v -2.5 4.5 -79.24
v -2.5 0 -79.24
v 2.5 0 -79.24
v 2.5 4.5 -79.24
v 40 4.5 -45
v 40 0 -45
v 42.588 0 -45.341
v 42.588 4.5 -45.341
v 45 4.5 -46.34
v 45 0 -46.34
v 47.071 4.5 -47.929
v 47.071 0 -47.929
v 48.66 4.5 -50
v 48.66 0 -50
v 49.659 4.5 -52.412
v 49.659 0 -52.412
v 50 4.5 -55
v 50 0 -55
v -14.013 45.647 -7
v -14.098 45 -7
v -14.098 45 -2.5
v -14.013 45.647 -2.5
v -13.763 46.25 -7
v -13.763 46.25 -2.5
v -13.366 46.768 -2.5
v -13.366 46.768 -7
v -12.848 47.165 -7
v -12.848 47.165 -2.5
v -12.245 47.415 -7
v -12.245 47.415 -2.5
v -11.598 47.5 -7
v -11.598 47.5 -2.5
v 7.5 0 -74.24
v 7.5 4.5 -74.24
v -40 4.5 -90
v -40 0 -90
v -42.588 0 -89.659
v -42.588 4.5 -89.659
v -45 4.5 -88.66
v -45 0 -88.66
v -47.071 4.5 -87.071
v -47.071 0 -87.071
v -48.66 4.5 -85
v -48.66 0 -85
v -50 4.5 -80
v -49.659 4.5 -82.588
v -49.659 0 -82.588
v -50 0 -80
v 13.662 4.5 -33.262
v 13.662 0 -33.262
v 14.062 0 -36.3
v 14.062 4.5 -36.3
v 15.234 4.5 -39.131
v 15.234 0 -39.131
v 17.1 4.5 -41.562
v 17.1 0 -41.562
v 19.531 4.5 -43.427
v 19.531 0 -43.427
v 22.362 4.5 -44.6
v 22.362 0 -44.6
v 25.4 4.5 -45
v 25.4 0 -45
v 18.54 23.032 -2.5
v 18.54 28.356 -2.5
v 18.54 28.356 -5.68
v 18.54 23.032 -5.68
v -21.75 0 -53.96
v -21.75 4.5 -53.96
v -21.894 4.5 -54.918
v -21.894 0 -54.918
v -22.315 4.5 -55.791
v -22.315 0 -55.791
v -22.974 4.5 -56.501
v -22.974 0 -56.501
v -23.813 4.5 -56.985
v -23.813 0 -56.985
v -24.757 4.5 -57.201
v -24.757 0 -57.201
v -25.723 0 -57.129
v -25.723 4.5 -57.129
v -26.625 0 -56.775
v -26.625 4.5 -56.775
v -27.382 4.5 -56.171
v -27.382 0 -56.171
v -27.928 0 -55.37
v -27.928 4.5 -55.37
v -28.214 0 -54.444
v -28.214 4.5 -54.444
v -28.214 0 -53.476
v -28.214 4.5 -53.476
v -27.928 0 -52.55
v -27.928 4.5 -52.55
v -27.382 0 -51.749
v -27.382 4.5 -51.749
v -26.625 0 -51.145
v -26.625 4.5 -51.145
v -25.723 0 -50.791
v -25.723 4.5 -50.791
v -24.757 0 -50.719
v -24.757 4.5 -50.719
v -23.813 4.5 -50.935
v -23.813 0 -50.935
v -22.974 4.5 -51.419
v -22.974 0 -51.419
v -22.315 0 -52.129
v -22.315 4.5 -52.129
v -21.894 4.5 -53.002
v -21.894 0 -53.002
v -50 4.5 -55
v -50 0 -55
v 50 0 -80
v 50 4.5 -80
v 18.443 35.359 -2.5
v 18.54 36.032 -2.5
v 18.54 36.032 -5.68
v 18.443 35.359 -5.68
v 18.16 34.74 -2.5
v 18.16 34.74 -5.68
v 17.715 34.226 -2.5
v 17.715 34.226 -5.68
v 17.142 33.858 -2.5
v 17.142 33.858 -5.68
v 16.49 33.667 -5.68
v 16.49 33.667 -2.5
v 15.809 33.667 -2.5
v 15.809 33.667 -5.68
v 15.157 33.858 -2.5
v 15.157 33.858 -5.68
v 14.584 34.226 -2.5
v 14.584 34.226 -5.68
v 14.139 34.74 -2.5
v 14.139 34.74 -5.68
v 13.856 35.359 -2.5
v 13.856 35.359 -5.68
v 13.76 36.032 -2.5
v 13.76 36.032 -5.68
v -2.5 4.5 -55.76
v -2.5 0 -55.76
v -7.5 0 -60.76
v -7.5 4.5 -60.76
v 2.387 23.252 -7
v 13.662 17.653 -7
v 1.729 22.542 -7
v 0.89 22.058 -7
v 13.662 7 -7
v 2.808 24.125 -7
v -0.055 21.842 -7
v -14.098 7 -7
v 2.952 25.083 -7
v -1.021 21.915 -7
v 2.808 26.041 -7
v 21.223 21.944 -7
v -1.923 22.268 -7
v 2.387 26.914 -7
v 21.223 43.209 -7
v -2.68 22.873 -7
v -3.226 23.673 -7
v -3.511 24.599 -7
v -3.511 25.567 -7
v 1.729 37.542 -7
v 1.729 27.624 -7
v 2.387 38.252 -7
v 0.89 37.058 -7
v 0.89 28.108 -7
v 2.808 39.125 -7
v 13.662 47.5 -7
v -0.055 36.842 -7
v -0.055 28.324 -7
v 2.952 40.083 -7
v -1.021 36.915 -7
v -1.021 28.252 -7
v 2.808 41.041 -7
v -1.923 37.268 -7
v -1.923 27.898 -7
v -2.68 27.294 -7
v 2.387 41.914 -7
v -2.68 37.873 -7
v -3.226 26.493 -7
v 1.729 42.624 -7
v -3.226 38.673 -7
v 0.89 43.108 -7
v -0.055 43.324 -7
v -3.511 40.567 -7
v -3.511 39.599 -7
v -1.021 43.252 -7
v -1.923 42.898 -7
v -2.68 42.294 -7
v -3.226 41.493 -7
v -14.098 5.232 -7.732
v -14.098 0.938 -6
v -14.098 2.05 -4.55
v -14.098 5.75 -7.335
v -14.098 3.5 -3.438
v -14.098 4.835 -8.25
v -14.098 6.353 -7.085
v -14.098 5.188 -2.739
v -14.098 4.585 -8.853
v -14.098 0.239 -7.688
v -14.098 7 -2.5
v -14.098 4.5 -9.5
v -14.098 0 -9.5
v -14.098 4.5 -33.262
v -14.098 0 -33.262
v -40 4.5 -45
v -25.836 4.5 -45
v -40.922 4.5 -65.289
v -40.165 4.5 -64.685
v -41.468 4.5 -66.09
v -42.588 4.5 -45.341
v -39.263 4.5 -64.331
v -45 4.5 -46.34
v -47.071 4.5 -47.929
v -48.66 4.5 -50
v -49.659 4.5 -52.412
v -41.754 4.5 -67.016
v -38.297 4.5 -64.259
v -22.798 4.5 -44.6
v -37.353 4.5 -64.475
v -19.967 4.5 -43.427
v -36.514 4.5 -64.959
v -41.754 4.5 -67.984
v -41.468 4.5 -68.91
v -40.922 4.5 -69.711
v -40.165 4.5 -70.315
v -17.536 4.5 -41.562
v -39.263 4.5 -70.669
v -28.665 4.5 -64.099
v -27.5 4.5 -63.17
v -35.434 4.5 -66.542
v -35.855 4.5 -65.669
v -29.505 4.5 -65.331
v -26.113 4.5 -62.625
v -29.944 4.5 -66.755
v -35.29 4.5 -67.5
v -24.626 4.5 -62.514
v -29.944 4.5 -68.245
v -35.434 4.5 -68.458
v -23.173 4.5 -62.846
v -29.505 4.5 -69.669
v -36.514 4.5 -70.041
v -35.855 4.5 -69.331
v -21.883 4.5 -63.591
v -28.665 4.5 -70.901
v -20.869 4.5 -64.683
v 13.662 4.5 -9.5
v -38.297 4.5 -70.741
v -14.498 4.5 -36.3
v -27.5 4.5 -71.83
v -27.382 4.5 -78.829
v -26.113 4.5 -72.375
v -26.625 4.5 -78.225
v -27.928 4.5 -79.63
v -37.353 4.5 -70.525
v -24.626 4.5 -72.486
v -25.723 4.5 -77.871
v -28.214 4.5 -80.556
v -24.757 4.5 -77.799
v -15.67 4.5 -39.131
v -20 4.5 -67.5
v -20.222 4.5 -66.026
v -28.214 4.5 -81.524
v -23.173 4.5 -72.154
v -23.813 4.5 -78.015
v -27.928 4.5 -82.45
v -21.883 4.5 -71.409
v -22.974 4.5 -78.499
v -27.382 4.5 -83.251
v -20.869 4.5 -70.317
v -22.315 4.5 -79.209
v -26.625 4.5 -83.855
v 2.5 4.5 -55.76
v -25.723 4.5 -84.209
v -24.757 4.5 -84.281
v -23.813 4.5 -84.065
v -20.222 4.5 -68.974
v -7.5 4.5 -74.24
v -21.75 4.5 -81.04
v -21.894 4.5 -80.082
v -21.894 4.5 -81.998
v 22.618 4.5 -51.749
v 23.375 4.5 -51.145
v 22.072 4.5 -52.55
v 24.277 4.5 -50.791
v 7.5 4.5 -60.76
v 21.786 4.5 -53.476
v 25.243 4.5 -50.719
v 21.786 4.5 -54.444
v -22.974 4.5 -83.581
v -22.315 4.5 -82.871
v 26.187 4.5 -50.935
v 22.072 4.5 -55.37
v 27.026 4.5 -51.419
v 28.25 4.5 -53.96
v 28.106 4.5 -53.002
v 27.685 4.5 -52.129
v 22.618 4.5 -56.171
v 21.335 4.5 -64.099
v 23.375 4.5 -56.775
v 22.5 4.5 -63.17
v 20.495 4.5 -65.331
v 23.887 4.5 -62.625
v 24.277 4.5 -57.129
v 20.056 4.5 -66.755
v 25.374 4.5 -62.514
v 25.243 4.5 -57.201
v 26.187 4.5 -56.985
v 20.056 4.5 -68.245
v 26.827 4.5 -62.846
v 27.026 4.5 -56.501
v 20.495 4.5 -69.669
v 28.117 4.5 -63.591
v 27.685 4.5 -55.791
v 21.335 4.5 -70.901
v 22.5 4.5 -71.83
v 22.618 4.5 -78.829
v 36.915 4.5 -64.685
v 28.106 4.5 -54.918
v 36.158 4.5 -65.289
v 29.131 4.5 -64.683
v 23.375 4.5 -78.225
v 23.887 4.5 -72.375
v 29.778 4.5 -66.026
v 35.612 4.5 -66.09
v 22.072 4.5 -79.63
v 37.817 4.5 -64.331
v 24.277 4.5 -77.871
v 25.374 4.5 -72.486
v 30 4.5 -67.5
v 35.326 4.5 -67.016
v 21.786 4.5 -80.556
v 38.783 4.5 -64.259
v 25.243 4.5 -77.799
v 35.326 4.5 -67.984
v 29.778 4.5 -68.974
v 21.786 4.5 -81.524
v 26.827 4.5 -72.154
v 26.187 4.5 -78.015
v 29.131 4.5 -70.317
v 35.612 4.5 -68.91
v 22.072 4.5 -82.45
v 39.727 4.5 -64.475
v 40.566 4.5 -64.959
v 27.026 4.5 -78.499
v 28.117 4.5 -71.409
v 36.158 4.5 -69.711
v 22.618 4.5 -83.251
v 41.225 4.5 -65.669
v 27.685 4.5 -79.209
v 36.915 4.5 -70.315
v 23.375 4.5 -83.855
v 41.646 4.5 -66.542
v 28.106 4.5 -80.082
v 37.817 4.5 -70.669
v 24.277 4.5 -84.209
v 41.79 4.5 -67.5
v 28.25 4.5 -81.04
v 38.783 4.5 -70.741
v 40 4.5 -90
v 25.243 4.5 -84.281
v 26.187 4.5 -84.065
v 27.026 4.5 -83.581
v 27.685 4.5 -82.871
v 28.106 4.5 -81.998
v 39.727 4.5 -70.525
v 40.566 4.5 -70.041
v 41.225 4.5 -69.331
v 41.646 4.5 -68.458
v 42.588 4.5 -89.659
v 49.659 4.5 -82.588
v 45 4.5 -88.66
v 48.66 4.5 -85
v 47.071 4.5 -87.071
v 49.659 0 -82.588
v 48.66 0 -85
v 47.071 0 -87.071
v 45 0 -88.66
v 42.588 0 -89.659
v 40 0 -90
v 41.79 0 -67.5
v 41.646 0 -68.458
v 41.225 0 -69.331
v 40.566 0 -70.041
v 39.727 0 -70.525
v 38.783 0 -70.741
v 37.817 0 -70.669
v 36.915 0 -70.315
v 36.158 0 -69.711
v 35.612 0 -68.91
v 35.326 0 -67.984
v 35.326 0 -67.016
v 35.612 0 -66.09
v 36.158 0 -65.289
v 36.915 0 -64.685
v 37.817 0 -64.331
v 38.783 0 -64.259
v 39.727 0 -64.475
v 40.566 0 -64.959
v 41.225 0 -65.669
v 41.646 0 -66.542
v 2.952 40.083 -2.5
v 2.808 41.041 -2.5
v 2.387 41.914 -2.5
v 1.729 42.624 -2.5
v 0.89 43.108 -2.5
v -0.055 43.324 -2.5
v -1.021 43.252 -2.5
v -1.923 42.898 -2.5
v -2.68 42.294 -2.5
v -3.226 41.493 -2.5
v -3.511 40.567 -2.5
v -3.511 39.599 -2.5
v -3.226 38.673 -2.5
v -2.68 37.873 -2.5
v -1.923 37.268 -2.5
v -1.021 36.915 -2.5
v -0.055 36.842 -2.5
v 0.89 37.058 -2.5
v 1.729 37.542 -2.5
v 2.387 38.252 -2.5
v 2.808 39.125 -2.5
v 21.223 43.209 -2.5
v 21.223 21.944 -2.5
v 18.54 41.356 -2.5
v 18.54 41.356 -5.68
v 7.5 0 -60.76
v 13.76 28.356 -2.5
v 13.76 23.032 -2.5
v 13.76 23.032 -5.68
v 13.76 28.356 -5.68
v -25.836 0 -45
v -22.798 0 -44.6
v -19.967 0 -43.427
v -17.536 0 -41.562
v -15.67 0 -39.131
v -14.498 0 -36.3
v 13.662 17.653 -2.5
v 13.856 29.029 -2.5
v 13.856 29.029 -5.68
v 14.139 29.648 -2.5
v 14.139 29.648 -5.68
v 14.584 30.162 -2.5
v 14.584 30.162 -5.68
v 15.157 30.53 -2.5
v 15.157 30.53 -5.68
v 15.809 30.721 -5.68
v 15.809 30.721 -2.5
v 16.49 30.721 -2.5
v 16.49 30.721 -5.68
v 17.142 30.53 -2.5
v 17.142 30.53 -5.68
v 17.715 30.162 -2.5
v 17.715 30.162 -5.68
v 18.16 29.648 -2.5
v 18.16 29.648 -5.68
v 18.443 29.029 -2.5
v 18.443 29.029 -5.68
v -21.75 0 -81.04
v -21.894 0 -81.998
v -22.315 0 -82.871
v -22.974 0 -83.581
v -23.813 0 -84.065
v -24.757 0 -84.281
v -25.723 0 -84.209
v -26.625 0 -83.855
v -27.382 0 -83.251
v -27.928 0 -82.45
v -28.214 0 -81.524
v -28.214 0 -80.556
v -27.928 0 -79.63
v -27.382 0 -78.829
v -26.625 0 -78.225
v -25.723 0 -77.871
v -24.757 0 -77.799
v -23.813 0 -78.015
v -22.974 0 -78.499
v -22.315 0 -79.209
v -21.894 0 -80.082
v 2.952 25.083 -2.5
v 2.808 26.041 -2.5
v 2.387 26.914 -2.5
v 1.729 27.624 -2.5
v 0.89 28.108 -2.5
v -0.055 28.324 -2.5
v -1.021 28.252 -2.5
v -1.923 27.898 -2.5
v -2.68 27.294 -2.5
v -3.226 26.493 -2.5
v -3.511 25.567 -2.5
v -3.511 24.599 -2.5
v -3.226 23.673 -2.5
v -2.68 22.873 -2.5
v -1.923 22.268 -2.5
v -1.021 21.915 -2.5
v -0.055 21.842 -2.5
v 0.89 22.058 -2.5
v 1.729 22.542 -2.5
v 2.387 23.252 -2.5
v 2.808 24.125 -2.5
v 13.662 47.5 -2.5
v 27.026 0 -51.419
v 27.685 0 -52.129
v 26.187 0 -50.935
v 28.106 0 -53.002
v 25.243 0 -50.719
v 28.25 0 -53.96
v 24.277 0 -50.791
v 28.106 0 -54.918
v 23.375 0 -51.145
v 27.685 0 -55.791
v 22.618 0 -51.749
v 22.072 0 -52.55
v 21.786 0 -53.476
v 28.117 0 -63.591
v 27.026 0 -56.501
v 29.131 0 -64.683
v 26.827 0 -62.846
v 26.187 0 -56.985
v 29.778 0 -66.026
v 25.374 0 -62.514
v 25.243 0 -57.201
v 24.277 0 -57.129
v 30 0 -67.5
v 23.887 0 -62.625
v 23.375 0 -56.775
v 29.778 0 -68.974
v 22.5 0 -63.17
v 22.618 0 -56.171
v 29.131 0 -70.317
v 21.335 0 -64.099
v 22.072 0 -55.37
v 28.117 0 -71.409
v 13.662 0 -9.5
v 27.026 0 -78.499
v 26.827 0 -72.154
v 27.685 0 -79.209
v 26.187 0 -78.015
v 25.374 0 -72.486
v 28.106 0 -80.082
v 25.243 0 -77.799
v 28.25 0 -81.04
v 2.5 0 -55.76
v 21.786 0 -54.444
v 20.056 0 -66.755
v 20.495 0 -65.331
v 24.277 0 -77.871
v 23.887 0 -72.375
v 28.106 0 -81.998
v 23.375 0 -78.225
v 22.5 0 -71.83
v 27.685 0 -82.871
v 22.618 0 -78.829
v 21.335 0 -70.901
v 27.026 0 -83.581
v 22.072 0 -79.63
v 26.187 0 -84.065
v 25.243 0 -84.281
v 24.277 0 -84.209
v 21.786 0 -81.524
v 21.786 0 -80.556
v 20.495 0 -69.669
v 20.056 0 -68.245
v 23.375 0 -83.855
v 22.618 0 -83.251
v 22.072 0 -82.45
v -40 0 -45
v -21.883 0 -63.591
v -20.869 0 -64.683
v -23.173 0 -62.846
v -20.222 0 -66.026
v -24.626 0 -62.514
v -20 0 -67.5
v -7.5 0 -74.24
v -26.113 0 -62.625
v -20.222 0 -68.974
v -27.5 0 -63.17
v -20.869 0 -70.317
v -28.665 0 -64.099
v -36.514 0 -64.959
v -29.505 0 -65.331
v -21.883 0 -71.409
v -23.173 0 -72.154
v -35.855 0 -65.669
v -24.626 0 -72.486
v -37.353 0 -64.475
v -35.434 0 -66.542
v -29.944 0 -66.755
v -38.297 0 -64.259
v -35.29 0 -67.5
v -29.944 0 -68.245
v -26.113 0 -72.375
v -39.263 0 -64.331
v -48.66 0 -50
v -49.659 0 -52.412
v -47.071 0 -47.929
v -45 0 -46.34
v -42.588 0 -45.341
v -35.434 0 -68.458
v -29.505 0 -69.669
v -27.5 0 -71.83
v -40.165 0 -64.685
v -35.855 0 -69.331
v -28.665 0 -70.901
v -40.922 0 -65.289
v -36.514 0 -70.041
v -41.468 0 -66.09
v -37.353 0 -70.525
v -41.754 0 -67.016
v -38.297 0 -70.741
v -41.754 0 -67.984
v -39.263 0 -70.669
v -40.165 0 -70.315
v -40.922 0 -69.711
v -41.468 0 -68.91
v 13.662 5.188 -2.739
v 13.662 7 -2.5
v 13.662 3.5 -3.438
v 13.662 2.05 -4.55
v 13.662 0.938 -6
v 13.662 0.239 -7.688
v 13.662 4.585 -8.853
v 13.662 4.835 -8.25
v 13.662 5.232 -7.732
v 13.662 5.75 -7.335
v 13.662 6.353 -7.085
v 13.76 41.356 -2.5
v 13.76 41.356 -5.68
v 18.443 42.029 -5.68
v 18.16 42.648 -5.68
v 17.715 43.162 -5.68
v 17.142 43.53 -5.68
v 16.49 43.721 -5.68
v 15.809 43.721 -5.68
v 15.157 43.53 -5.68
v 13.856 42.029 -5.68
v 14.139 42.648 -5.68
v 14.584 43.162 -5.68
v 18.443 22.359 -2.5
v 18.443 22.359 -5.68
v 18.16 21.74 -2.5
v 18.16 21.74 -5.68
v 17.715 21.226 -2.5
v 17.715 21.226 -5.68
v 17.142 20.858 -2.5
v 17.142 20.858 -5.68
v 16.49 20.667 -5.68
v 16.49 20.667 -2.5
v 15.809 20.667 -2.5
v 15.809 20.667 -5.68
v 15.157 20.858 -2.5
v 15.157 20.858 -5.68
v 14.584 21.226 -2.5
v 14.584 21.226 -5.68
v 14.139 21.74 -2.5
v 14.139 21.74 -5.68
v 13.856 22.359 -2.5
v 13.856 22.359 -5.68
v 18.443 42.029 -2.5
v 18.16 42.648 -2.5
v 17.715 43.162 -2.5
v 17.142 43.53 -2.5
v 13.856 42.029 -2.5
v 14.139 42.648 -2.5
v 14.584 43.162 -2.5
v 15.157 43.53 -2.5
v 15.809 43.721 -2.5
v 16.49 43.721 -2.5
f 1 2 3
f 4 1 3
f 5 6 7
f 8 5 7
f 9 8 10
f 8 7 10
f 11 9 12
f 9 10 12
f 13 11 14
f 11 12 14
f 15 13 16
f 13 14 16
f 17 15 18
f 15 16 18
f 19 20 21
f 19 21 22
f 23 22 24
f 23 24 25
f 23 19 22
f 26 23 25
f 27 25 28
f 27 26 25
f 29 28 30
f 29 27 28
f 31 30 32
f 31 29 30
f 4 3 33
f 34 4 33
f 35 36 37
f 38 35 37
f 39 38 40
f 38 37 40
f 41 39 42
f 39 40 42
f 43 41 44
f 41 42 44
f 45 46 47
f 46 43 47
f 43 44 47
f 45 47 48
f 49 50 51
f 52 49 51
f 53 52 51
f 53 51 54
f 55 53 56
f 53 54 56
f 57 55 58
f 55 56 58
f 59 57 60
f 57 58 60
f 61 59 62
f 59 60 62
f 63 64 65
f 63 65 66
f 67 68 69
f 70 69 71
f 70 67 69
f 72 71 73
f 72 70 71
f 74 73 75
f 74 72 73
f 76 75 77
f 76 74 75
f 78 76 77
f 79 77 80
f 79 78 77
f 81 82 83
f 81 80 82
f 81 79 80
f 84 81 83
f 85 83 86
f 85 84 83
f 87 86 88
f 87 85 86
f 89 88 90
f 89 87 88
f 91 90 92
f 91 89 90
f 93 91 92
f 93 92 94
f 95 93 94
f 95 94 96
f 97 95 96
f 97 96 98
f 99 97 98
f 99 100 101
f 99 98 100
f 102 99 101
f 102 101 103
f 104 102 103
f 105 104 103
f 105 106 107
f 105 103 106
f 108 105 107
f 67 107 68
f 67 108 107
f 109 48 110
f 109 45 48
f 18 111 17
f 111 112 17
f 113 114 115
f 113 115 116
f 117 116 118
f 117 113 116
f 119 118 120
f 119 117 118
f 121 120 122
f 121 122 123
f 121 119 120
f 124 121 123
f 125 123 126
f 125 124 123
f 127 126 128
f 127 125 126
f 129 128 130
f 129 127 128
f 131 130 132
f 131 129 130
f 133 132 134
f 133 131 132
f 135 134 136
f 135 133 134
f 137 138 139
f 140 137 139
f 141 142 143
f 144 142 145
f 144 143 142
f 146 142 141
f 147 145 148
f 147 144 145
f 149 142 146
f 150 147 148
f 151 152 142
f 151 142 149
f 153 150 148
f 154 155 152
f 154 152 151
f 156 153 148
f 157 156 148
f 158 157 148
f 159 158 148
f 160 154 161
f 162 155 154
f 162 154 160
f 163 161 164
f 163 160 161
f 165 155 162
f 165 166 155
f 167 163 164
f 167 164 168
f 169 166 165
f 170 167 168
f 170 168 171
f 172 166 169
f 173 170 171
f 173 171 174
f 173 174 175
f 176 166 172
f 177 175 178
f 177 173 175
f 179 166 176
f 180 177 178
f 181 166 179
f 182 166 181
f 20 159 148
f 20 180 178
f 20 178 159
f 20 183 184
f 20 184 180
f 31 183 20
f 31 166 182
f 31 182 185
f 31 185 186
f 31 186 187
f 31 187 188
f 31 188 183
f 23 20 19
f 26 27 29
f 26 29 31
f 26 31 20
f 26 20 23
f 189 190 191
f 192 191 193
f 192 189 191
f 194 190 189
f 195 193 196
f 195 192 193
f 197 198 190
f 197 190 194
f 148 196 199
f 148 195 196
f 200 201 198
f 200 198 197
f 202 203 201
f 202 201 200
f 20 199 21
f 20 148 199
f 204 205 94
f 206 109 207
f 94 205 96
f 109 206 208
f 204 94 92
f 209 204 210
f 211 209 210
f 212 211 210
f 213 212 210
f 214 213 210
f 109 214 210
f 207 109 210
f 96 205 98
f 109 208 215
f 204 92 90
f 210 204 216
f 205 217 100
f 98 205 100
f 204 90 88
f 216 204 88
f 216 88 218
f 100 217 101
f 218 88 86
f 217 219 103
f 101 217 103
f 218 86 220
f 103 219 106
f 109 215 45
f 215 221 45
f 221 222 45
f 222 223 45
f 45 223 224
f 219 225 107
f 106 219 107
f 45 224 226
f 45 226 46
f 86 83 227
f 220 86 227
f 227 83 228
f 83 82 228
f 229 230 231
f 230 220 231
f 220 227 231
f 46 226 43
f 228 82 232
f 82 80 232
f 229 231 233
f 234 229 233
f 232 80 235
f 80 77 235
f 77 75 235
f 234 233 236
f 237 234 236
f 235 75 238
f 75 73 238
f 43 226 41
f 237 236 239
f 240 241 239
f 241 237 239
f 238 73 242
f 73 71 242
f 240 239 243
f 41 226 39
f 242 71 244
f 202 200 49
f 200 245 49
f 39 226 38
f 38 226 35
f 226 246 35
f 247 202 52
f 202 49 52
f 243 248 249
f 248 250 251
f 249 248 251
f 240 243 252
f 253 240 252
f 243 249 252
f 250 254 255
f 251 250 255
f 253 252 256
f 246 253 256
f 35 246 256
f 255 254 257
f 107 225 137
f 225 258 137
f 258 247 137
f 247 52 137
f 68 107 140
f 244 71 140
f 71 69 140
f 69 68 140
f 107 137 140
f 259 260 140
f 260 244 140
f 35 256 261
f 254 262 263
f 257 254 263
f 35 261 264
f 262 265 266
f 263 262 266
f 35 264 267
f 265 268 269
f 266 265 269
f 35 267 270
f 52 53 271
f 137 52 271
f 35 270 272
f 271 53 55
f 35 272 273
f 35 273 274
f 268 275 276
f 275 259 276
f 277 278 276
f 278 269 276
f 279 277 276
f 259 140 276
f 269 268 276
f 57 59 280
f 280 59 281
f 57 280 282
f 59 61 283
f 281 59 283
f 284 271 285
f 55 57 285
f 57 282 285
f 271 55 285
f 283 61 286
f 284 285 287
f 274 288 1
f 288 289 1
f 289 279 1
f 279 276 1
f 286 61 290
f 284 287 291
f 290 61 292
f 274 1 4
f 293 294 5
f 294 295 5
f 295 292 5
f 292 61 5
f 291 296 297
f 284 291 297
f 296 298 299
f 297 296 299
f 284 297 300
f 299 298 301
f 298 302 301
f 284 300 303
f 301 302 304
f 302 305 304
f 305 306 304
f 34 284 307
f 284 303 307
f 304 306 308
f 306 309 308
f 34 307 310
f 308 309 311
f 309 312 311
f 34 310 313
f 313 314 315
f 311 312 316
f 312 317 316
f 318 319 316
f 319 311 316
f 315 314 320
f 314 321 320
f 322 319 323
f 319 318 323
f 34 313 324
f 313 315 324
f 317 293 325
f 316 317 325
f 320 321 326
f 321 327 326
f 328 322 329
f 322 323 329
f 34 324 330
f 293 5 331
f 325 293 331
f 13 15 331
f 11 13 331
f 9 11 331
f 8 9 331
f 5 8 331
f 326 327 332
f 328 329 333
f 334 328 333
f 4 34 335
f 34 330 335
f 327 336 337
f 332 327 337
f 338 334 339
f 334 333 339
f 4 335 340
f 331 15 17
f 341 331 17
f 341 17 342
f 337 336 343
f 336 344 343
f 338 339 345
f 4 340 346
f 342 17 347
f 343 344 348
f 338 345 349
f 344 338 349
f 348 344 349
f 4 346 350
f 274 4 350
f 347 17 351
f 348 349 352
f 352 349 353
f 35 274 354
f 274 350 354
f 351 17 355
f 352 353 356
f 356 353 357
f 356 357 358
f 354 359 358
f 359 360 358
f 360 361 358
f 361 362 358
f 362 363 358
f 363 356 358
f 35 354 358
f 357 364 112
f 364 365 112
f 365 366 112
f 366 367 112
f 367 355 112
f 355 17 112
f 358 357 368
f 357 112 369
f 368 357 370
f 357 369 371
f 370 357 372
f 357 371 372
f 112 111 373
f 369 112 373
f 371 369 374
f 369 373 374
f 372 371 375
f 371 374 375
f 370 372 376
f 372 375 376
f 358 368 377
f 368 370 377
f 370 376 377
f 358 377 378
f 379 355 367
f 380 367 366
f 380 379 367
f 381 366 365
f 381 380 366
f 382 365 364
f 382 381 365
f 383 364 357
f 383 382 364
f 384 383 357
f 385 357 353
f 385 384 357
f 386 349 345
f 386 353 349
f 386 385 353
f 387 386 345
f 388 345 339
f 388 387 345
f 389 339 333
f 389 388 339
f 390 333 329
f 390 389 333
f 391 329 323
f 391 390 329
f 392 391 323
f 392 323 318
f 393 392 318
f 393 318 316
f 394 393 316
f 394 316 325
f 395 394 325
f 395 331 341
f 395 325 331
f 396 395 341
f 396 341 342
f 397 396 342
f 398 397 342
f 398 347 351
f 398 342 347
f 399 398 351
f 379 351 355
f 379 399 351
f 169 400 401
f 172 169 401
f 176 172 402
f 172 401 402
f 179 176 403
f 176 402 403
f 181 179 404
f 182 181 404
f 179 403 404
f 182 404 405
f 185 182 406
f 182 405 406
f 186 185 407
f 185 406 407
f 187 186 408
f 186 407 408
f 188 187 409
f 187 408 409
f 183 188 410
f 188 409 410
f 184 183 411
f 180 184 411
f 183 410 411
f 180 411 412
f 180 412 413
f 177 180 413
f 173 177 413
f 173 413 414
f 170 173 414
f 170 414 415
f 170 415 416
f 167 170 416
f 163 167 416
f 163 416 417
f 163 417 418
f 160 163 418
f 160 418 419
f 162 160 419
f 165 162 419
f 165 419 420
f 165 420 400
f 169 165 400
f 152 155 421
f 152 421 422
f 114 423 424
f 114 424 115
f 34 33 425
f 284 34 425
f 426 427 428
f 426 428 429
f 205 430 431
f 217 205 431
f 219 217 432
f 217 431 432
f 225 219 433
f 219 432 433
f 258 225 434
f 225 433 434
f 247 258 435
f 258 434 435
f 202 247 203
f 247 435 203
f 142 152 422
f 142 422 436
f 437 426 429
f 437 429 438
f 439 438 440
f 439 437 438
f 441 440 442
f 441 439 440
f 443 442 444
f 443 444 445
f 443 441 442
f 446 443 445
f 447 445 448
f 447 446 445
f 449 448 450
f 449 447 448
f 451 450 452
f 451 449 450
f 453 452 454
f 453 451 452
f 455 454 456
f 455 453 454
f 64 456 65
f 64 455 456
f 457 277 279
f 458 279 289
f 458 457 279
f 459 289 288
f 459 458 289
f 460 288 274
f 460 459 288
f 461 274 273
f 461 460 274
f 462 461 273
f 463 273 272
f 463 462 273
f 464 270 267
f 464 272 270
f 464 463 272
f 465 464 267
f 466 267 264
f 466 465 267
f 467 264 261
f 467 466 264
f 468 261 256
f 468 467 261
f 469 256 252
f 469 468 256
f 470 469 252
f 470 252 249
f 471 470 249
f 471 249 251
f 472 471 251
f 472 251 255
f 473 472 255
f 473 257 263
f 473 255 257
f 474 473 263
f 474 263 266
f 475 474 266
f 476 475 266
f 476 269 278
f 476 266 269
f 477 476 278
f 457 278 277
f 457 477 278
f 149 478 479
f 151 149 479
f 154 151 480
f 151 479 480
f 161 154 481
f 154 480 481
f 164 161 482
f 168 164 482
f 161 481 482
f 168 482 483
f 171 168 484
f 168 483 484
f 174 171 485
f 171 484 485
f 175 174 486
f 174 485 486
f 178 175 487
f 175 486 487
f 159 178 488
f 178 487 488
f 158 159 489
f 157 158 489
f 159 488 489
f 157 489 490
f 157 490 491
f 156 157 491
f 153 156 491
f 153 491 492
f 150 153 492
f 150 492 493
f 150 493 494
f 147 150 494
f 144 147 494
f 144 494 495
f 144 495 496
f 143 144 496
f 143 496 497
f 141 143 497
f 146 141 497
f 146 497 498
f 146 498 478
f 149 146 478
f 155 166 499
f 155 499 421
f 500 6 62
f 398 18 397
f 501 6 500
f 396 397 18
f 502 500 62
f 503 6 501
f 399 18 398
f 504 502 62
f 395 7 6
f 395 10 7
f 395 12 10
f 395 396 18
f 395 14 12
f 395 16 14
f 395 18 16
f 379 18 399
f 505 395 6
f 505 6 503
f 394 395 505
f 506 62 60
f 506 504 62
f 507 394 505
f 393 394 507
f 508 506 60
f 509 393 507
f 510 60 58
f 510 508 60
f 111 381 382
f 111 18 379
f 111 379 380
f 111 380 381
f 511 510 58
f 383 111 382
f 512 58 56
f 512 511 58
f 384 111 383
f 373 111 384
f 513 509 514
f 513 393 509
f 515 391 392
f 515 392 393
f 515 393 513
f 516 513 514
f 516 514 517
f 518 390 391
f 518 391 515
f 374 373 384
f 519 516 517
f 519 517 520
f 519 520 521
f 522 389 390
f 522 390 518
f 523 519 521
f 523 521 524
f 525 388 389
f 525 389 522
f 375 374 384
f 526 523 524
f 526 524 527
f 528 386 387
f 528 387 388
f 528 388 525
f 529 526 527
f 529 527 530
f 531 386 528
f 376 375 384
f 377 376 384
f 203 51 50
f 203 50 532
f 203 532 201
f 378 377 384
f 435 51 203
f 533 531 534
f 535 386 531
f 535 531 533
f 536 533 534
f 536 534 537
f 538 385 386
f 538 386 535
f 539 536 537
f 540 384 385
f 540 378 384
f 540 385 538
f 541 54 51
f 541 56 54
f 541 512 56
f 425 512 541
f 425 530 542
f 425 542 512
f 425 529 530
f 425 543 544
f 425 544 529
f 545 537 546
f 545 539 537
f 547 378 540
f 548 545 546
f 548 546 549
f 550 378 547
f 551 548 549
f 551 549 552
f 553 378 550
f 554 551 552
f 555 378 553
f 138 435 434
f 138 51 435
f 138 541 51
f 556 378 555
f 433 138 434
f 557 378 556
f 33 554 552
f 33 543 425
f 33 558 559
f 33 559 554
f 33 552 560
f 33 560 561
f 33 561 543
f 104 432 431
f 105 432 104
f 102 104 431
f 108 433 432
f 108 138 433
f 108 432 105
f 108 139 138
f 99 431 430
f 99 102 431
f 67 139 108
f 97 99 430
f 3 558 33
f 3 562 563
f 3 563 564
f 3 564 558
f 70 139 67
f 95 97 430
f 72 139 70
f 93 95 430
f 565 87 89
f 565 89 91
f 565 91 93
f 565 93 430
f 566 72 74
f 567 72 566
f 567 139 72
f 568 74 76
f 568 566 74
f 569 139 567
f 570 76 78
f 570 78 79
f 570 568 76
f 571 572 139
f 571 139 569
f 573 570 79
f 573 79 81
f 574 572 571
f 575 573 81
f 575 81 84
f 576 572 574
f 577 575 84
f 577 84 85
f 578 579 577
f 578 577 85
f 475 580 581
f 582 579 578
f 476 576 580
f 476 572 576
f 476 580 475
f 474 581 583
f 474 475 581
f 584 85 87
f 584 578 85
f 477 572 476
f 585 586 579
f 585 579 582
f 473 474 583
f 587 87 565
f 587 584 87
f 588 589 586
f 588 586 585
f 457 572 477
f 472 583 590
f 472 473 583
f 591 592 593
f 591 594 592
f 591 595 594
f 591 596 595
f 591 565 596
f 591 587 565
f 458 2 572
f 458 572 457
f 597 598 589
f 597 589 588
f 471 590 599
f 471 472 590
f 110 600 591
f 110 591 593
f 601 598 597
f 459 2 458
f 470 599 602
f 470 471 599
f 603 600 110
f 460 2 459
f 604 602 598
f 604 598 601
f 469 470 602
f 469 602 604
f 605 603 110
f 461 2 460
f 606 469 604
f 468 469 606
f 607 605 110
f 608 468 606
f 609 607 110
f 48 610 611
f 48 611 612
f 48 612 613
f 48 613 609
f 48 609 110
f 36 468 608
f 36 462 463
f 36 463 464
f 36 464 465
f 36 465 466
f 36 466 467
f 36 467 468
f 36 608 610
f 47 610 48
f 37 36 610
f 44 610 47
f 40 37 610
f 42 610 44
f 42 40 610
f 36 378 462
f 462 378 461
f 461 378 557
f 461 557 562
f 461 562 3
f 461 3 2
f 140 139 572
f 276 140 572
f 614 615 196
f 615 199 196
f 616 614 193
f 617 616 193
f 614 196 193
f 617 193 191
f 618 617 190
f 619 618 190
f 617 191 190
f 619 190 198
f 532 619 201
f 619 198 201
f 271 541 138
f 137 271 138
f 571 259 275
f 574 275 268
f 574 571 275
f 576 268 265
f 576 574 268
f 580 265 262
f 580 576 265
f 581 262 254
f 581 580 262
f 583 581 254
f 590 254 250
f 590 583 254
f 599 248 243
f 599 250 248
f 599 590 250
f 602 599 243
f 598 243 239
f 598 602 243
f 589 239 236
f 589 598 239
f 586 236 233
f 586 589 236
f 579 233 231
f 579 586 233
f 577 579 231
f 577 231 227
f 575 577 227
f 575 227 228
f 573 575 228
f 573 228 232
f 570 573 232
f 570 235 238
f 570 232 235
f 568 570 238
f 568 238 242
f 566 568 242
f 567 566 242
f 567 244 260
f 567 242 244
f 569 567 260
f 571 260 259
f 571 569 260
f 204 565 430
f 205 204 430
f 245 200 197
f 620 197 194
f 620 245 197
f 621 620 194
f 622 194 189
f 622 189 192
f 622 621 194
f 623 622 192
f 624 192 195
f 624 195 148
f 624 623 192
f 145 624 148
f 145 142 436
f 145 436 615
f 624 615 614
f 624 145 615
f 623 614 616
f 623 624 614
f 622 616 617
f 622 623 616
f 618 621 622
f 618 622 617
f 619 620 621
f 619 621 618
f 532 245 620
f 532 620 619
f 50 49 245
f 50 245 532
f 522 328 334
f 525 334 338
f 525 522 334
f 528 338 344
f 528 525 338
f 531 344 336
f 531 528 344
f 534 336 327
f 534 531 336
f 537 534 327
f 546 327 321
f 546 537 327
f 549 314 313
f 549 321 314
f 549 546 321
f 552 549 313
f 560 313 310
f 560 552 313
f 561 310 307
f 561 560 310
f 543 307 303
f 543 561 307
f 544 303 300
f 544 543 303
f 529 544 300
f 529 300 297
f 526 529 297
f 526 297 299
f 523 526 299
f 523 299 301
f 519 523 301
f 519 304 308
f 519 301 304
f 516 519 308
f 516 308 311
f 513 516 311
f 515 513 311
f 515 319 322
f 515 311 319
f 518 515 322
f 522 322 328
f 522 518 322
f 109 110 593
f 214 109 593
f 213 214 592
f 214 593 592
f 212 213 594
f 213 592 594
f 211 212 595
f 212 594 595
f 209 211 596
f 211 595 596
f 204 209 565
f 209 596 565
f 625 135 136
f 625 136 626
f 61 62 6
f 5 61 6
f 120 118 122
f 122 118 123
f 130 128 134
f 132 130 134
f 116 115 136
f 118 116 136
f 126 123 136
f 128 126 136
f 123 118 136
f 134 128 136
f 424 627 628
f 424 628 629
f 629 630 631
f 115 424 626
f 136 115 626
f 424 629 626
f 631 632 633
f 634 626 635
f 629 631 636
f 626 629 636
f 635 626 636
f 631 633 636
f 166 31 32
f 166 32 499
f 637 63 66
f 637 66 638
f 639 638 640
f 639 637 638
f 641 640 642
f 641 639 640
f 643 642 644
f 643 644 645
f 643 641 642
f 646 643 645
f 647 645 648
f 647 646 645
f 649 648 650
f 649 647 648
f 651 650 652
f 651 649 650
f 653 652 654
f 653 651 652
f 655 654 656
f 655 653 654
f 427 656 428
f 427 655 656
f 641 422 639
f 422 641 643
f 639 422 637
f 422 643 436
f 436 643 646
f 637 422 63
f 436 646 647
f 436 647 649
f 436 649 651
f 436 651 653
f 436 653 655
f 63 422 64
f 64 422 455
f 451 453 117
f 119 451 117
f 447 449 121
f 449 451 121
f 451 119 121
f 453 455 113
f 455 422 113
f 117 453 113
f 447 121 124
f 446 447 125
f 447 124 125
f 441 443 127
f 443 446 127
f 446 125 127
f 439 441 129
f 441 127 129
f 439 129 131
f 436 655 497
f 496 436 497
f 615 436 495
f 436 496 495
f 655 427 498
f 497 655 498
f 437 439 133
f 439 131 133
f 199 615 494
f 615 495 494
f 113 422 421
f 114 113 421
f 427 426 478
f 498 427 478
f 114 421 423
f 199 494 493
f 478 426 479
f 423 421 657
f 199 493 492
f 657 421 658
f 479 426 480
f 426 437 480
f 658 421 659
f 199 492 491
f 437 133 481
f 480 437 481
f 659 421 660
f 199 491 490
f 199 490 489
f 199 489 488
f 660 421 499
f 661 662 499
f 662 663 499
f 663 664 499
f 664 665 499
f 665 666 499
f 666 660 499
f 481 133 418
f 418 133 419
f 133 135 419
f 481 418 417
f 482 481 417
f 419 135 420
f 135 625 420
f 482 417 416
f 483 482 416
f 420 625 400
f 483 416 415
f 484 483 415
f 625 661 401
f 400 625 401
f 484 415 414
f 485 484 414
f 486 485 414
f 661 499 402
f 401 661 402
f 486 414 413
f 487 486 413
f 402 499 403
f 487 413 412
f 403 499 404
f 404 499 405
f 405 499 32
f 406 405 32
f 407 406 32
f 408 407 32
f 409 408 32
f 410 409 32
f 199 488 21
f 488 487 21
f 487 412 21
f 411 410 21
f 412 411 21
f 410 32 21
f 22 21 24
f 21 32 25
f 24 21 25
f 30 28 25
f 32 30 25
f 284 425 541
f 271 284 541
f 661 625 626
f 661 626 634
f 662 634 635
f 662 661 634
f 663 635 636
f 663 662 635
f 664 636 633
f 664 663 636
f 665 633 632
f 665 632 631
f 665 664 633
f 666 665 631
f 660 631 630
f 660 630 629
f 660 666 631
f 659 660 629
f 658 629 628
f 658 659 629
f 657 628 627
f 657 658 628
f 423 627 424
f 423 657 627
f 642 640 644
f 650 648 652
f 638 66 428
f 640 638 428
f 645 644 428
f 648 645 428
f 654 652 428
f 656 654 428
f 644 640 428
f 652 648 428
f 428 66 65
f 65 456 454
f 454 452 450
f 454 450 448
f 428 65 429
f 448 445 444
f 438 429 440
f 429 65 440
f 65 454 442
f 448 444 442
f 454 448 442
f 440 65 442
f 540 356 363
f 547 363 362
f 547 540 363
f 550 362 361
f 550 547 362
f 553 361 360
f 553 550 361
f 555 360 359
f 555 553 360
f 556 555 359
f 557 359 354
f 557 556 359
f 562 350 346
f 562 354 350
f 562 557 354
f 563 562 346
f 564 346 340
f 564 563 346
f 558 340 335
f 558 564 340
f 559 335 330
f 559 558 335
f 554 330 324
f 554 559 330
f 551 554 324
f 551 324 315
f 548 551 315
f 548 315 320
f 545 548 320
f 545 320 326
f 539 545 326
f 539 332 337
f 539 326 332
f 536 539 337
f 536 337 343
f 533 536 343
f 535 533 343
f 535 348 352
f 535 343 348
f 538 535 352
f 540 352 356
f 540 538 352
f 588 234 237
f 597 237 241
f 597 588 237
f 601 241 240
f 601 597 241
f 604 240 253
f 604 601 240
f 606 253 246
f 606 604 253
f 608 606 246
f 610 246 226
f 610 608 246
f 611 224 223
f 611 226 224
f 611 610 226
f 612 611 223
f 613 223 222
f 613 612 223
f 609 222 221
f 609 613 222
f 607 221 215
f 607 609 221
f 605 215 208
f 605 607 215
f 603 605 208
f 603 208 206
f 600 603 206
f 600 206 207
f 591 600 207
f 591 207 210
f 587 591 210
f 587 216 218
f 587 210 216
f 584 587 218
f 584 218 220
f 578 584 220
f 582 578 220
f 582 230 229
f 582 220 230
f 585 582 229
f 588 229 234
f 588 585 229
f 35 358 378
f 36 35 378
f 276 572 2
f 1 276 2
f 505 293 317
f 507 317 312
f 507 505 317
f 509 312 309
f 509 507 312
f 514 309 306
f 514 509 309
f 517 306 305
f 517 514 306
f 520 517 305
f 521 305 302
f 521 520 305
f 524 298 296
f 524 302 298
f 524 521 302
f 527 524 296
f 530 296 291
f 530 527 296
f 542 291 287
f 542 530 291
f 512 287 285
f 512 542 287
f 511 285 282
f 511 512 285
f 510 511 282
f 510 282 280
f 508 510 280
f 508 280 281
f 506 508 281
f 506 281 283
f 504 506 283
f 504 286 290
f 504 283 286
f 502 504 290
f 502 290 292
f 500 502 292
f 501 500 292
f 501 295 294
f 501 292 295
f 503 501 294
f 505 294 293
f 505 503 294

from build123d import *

# Parameters (mm, degrees)
BOSS_EXTRUDE1_DEPTH      = 50
SKETCH2_OUTSIDE_W        = 130.372
SKETCH2_OUTSIDE_H        = 120.372
SKETCH2_OUTSIDE_R        = 5
SKETCH2_OUTSIDE_R_2      = 3.25
CUT_EXTRUDE34_DEPTH      = 46
CUT_EXTRUDE34_DEPTH_BACK = 1
BOSS_EXTRUDE3_DEPTH      = 4.5
FILLET3_R                = 2.5
FILLET4_R                = 7
SKETCH6_R                = 3.25
CUT_EXTRUDE35_DEPTH      = 1
CUT_EXTRUDE35_DEPTH_BACK = 88.5
CUT_EXTRUDE39_DEPTH      = 3.18


with BuildPart() as part:
    # Sketch1 → Boss-Extrude1 (new body, symmetric)
    with BuildSketch(Plane(origin=(0, 0, 0), x_dir=(0, 0, -1), z_dir=(1, 0, 0))):
        Polygon((0, 0), (0, 45), (4.5, 45), (4.5, 4.5), (90, 4.5), (90, 0), align=None)
    extrude(amount=BOSS_EXTRUDE1_DEPTH, both=True)

    # Sketch2 outside → Cut-Extrude34 (cut, two sides)
    with BuildSketch(Plane(origin=(0, 0, 0), x_dir=(1, 0, 0), z_dir=(0, 1, 0))) as cut_extrude34_sk:
        with Locations((0, 45)):
            Rectangle(SKETCH2_OUTSIDE_W, SKETCH2_OUTSIDE_H)
        with BuildLine():
            Line((-40, 45), (-25.836010131, 45))
            ThreePointArc((-25.836010131, 45), (-17.535836731, 41.561955607), (-14.097792338, 33.261782207))
            Line((-14.097792338, 33.261782207), (-14.097792338, 7))
            Line((-14.097792338, 7), (13.661782207, 7))
            Line((13.661782207, 7), (13.661782207, 33.261782207))
            ThreePointArc((13.661782207, 33.261782207), (17.099826599, 41.561955607), (25.4, 45))
            Line((25.4, 45), (40, 45))
            ThreePointArc((40, 45), (47.071067812, 47.928932188), (50, 55))
            Line((50, 55), (50, 80))
            ThreePointArc((50, 80), (47.071067812, 87.071067812), (40, 90))
            Line((40, 90), (-40, 90))
            ThreePointArc((-40, 90), (-47.071067812, 87.071067812), (-50, 80))
            Line((-50, 80), (-50, 55))
            ThreePointArc((-50, 55), (-47.071067812, 47.928932188), (-40, 45))
        make_face(mode=Mode.SUBTRACT)
        with Locations((-25, 67.5)):
            Circle(SKETCH2_OUTSIDE_R)
        with Locations((25, 67.5)):
            Circle(SKETCH2_OUTSIDE_R)
        with Locations((25, 81.04)):
            Circle(SKETCH2_OUTSIDE_R_2)
        with Locations((25, 53.96)):
            Circle(SKETCH2_OUTSIDE_R_2)
        with Locations((38.54, 67.5)):
            Circle(SKETCH2_OUTSIDE_R_2)
        with Locations((-25, 81.04)):
            Circle(SKETCH2_OUTSIDE_R_2)
        with Locations((-25, 53.96)):
            Circle(SKETCH2_OUTSIDE_R_2)
        with Locations((-38.54, 67.5)):
            Circle(SKETCH2_OUTSIDE_R_2)
        Polygon((-2.5, 79.24), (2.5, 79.24), (7.5, 74.24), (7.5, 60.76), (2.5, 55.76), (-2.5, 55.76), (-7.5, 60.76), (-7.5, 74.24), align=None)
    extrude(amount=CUT_EXTRUDE34_DEPTH, mode=Mode.SUBTRACT)
    extrude(cut_extrude34_sk.sketch, amount=-CUT_EXTRUDE34_DEPTH_BACK, mode=Mode.SUBTRACT)

    # Sketch4 → Boss-Extrude3 (add)
    with BuildSketch(Plane.XY.offset(-7)):
        with BuildLine():
            Line((-14.097792338, 0), (-14.097792338, 45))
            ThreePointArc((-14.097792338, 45), (-13.365559291, 46.767766953), (-11.597792338, 47.5))
            Line((-11.597792338, 47.5), (13.661782207, 47.5))
            Line((13.661782207, 47.5), (21.222778521, 43.209368433))
            Line((21.222778521, 43.209368433), (21.222778521, 21.944029683))
            Line((21.222778521, 21.944029683), (13.661782207, 17.653398116))
            Line((13.661782207, 17.653398116), (13.661782207, 4.5))
            Line((13.661782207, 4.5), (13.661782207, 0))
            Line((13.661782207, 0), (-14.097792338, 0))
        make_face()
    extrude(amount=BOSS_EXTRUDE3_DEPTH)

    # Fillet3
    fillet3_edges = [part.edges().sort_by_distance(p)[0] for p in [
        (-0.218005066, 4.5, -7),
    ]]
    fillet(fillet3_edges, radius=FILLET3_R)

    # Fillet4
    fillet4_edges = [part.edges().sort_by_distance(p)[0] for p in [
        (-0.218005066, 0, -2.5),
    ]]
    fillet(fillet4_edges, radius=FILLET4_R)

    # Sketch6 → Cut-Extrude35 (cut, two sides)
    with BuildSketch(Plane.XY.offset(-2.5)) as cut_extrude35_sk:
        with Locations((-0.297792338, 40.083077312)):
            Circle(SKETCH6_R)
        with Locations((-0.297792338, 25.083077312)):
            Circle(SKETCH6_R)
    extrude(amount=CUT_EXTRUDE35_DEPTH, mode=Mode.SUBTRACT)
    extrude(cut_extrude35_sk.sketch, amount=-CUT_EXTRUDE35_DEPTH_BACK, mode=Mode.SUBTRACT)

    # Sketch7 → Cut-Extrude39 (cut)
    with BuildSketch(Plane.XY.offset(-2.5)):
        with BuildLine():
            Line((18.539617084, 41.355633115), (18.539617084, 36.032215871))
            ThreePointArc((18.539617084, 36.032215871), (16.149617084, 33.642215871), (13.759617084, 36.032215871))
            Line((13.759617084, 36.032215871), (13.759617084, 41.355633115))
            ThreePointArc((13.759617084, 41.355633115), (16.149617084, 43.745633115), (18.539617084, 41.355633115))
        make_face()
        with BuildLine():
            Line((18.539617084, 28.355633115), (18.539617084, 23.032215871))
            ThreePointArc((18.539617084, 23.032215871), (16.149617084, 20.642215871), (13.759617084, 23.032215871))
            Line((13.759617084, 23.032215871), (13.759617084, 28.355633115))
            ThreePointArc((13.759617084, 28.355633115), (16.149617084, 30.745633115), (18.539617084, 28.355633115))
        make_face()
    extrude(amount=-CUT_EXTRUDE39_DEPTH, mode=Mode.SUBTRACT)


solid = part.part
